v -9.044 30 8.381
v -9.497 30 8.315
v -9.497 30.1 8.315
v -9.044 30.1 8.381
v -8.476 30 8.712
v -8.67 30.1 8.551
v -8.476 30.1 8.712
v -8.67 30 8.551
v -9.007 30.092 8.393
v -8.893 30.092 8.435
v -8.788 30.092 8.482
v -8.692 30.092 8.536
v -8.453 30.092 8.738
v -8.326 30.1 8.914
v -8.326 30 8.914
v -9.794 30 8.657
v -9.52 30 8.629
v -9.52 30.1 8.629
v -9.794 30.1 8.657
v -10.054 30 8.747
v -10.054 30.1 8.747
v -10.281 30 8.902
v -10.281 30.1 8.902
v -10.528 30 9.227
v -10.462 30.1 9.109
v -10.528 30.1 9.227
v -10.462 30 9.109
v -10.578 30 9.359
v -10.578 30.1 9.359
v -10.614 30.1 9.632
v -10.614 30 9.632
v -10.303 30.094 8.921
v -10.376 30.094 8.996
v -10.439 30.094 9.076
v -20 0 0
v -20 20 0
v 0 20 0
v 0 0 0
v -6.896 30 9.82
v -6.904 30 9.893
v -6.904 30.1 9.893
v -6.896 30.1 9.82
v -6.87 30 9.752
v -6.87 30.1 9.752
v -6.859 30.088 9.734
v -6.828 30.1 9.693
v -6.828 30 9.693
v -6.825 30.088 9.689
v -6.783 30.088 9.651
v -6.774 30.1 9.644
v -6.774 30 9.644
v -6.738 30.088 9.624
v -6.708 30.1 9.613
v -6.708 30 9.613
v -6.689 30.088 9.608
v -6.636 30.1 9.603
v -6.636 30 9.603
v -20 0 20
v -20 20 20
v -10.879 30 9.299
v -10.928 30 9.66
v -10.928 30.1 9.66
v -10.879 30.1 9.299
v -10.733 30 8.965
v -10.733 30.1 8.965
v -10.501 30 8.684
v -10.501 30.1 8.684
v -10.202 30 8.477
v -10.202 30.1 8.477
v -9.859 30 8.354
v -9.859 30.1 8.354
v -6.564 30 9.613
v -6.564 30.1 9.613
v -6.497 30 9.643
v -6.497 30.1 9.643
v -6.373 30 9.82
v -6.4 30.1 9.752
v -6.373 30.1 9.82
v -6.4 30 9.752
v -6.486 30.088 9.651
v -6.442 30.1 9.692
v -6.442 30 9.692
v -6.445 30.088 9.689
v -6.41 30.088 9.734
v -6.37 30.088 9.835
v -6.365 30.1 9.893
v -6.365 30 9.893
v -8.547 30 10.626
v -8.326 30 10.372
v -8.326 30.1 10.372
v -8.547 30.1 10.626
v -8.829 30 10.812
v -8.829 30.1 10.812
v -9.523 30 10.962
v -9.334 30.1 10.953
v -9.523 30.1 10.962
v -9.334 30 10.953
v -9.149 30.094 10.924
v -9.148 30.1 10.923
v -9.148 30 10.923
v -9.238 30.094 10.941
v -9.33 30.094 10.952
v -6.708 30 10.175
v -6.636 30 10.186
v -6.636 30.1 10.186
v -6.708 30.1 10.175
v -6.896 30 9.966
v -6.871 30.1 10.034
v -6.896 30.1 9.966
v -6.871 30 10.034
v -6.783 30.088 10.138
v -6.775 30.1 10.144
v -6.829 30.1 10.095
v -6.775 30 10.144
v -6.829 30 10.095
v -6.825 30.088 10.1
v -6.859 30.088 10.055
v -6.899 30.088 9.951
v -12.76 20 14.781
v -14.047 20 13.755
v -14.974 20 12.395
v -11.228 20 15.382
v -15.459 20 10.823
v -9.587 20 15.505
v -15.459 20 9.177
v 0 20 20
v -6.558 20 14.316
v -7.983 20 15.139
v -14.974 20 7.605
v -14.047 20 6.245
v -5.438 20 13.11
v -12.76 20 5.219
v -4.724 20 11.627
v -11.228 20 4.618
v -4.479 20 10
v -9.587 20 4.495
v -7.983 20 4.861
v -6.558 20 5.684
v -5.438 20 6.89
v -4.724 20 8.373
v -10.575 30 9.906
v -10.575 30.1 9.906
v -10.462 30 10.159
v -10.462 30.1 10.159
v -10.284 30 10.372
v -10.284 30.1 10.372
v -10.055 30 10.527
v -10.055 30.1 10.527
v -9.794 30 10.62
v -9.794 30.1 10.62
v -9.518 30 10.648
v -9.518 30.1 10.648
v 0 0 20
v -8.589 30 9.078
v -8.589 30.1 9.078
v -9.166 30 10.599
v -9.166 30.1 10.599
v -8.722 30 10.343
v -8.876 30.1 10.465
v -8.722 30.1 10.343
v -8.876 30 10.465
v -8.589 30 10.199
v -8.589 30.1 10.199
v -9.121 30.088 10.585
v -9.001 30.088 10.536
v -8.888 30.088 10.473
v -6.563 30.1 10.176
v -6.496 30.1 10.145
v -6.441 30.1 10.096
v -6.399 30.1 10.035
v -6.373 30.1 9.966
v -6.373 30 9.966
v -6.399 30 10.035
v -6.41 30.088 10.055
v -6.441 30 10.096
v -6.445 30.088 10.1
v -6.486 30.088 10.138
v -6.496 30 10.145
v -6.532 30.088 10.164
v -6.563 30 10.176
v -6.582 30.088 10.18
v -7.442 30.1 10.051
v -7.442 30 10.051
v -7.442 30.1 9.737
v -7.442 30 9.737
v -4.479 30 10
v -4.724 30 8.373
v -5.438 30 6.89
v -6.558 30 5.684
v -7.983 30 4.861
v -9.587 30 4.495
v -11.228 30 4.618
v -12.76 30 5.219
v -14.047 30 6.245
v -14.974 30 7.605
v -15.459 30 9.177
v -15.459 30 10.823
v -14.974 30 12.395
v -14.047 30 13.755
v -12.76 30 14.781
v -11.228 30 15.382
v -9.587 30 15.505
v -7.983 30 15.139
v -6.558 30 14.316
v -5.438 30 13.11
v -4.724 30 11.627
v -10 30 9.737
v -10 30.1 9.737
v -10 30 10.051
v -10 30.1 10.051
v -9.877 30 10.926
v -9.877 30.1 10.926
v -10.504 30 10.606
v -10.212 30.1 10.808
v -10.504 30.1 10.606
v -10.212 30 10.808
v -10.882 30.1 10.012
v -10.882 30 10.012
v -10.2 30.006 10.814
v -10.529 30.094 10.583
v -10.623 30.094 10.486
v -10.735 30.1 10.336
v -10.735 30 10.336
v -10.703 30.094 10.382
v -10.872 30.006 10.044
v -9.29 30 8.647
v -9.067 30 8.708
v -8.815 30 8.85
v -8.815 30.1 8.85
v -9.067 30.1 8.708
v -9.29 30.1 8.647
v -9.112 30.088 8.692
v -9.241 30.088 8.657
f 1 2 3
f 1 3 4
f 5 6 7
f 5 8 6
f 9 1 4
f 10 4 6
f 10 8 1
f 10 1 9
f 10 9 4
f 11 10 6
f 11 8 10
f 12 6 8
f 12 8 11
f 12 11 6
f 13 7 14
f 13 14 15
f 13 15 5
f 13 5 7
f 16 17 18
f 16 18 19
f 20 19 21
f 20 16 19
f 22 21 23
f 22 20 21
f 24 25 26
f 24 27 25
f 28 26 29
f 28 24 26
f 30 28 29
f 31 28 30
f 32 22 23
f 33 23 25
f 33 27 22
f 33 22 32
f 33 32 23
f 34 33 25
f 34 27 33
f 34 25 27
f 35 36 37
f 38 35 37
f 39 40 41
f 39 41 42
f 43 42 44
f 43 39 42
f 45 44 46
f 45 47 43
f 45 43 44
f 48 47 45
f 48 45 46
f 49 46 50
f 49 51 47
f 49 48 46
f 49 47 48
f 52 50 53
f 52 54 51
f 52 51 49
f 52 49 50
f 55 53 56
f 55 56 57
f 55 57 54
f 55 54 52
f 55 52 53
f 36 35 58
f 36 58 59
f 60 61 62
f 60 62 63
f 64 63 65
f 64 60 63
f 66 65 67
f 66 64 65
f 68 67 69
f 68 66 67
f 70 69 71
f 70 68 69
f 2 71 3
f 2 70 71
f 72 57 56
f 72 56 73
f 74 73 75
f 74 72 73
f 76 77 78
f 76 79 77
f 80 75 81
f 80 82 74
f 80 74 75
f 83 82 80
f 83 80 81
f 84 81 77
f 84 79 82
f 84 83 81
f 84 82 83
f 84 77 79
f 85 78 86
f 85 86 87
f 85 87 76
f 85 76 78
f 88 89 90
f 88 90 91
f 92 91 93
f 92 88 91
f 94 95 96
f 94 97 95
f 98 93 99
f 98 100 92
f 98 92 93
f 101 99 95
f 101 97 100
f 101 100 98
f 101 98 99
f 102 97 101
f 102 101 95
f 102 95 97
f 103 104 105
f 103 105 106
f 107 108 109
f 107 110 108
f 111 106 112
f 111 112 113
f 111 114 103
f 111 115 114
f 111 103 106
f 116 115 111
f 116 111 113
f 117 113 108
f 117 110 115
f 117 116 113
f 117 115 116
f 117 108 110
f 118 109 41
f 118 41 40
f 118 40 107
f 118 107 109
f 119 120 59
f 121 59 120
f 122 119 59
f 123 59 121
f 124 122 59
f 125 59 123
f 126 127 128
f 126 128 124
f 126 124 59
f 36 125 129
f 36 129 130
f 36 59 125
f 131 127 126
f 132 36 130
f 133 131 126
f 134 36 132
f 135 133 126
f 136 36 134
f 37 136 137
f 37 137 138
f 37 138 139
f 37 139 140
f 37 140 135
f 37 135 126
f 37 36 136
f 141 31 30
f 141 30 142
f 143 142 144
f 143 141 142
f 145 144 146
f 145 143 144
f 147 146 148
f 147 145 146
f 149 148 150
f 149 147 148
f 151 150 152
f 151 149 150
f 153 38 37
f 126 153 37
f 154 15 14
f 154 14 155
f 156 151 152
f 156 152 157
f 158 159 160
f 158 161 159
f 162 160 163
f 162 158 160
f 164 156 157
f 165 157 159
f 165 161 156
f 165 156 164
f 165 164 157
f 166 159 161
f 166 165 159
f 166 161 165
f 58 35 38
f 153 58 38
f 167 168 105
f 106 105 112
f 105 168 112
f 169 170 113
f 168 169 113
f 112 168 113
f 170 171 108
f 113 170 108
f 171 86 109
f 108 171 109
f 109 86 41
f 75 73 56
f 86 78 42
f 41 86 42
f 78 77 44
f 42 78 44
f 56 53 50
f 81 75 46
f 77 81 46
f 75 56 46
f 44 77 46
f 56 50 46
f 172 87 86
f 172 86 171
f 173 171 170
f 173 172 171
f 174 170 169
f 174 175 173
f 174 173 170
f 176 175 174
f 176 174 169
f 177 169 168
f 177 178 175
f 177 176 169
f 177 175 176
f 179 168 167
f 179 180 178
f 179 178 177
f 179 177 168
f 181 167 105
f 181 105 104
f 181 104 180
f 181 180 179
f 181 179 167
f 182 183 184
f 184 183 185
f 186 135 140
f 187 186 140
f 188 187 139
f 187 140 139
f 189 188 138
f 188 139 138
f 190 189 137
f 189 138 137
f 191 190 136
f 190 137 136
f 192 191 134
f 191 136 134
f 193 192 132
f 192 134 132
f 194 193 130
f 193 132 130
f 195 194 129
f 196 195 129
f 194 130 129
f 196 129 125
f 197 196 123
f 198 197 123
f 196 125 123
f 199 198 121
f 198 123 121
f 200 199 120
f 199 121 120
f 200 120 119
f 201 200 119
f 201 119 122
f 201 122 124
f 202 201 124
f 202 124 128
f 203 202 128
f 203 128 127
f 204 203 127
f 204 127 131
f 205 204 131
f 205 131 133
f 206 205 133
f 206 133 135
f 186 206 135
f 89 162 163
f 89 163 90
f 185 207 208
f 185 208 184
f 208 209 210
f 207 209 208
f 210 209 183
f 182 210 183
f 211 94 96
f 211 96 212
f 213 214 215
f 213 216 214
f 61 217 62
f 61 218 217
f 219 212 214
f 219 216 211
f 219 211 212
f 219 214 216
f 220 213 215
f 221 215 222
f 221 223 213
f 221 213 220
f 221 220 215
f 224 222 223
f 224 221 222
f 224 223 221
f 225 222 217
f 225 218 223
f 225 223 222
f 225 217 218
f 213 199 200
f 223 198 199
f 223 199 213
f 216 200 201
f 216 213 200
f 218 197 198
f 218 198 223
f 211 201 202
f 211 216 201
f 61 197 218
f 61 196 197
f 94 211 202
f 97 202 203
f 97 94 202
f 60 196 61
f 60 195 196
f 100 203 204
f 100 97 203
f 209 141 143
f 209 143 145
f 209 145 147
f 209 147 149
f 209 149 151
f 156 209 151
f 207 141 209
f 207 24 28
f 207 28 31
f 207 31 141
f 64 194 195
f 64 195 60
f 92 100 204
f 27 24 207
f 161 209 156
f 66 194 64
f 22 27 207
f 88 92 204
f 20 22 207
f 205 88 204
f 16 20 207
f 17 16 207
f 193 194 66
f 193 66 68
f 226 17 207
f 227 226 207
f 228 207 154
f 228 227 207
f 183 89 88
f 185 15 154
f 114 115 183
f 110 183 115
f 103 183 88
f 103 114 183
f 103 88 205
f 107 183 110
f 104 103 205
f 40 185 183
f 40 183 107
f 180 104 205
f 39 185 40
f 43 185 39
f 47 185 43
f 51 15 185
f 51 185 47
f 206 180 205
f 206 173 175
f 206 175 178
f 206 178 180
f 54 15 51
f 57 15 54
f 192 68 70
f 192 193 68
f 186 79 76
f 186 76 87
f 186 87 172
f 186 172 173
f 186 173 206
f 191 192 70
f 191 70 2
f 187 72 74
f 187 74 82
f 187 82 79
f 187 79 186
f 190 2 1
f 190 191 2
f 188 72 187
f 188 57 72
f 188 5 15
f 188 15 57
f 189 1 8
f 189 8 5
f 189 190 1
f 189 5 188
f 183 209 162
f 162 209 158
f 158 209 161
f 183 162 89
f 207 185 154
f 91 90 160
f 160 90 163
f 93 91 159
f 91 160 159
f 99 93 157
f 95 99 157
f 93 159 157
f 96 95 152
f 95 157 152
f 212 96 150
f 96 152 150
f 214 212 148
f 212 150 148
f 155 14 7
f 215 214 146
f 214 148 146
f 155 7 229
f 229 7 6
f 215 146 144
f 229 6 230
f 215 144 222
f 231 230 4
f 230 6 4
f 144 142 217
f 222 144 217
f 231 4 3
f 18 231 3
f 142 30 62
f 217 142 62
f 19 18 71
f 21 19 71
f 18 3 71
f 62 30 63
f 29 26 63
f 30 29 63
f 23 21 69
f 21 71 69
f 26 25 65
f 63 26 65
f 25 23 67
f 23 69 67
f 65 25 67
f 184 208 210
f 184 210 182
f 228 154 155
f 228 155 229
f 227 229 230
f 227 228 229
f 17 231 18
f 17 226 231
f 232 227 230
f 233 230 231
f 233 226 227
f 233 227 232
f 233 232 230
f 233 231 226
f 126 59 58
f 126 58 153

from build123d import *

# Parameters (mm, degrees)
SKETCH1_W           = 20
SKETCH1_H           = 20
BOSS_EXTRUDE1_DEPTH = 20
SKETCH2_R           = 5.520822916
BOSS_EXTRUDE3_DEPTH = 30
BOSS_EXTRUDE4_DEPTH = 0.1
SKETCH4_W           = 2.557692308
SKETCH4_H           = 0.314102564
BOSS_EXTRUDE5_DEPTH = 0.1


with BuildPart() as part:
    # Sketch1 → Boss-Extrude1 (new body)
    with BuildSketch(Plane.XY):
        with Locations((-10, 10)):
            Rectangle(SKETCH1_W, SKETCH1_H)
    extrude(amount=BOSS_EXTRUDE1_DEPTH)

    # Sketch2 → Boss-Extrude3 (add)
    with BuildSketch(Plane(origin=(0, 0, 0), x_dir=(1, 0, 0), z_dir=(0, 1, 0))):
        with Locations((-10, -10)):
            Circle(SKETCH2_R)
    extrude(amount=BOSS_EXTRUDE3_DEPTH)

    # Sketch3 → Boss-Extrude4 (add)
    with BuildSketch(Plane(origin=(0, 30, 0), x_dir=(1, 0, 0), z_dir=(0, 1, 0))):
        with BuildLine():
            Line((-8.325722208, -8.914299791), (-8.588642881, -9.077661169))
            add(Edge.make_bspline(
                [(-8.588642881, -9.077661169), (-8.617472747, -9.041832775), (-8.674219442, -8.971310665), (-8.772758678, -8.880300732), (-8.877770093, -8.80213369), (-8.99104814, -8.738429939), (-9.11243394, -8.689208489), (-9.241448792, -8.654378283), (-9.378074297, -8.63267404), (-9.471739496, -8.630207204), (-9.519732625, -8.628943221)],
                knots=[0, 0, 0, 0, 1.026593902, 2.0206758, 2.988051866, 3.946915611, 4.916868779, 5.907761954, 6.927957743, 8, 8, 8, 8], degree=3))
            add(Edge.make_bspline(
                [(-9.519732625, -8.628943221), (-9.558091582, -8.630000063), (-9.633638505, -8.632081485), (-9.744544658, -8.645091978), (-9.850187011, -8.668733986), (-9.95122772, -8.699884943), (-10.046948139, -8.741635233), (-10.137599057, -8.792444989), (-10.223984547, -8.85149503), (-10.303601288, -8.919905575), (-10.376430295, -8.994304243), (-10.439529209, -9.074057938), (-10.494466143, -9.156777829), (-10.537572099, -9.244529571), (-10.572847269, -9.335305625), (-10.59605399, -9.43081948), (-10.611518685, -9.529847488), (-10.613288014, -9.597365828), (-10.614183747, -9.631547387)],
                knots=[0, 0, 0, 0, 1.112346261, 2.190735716, 3.231507886, 4.247384806, 5.251966152, 6.253067467, 7.256802811, 8.280671706, 9.291813951, 10.270744147, 11.225547591, 12.165006084, 13.100104208, 14.043489273, 15.009504848, 16, 16, 16, 16], degree=3))
            add(Edge.make_bspline(
                [(-10.614183747, -9.631547387), (-10.612404495, -9.676316598), (-10.608869964, -9.765251794), (-10.581168504, -9.896529896), (-10.535824097, -10.023453586), (-10.473766246, -10.145121723), (-10.395289112, -10.257715879), (-10.303116549, -10.358699333), (-10.197197465, -10.446115361), (-10.078465135, -10.518587886), (-9.949707391, -10.576849254), (-9.812317286, -10.618356587), (-9.667417506, -10.643408959), (-9.568210759, -10.646564902), (-9.51762926, -10.64817399)],
                knots=[0, 0, 0, 0, 0.966302908, 1.919585723, 2.883856336, 3.870342332, 4.860282998, 5.839159637, 6.814385684, 7.815993281, 8.834850808, 9.858348828, 10.908058873, 12, 12, 12, 12], degree=3))
            add(Edge.make_bspline(
                [(-9.51762926, -10.64817399), (-9.471274075, -10.646874493), (-9.380173837, -10.644320636), (-9.247006552, -10.622791672), (-9.120226641, -10.587548039), (-8.99983861, -10.538400389), (-8.886062444, -10.474872873), (-8.779633269, -10.396513702), (-8.678433331, -10.305577102), (-8.618936355, -10.23525913), (-8.588642881, -10.199456041)],
                knots=[0, 0, 0, 0, 1.039848629, 2.043578496, 3.018386758, 3.987534228, 4.954977003, 5.934852016, 6.948509513, 8, 8, 8, 8], degree=3))
            Line((-8.588642881, -10.199456041), (-8.325722208, -10.371932003))
            add(Edge.make_bspline(
                [(-8.325722208, -10.371932003), (-8.341309911, -10.39482273), (-8.372433577, -10.440528206), (-8.424461203, -10.504972323), (-8.480581035, -10.565294005), (-8.540574131, -10.621412395), (-8.603657141, -10.674670415), (-8.671985051, -10.722521989), (-8.743354662, -10.767656812), (-8.81860382, -10.808269684), (-8.896954518, -10.844776005), (-8.978296508, -10.876167176), (-9.06227632, -10.903137282), (-9.148992697, -10.924574629), (-9.238616595, -10.941685467), (-9.330916229, -10.953039169), (-9.425859811, -10.96151445), (-9.490031962, -10.962020317), (-9.522537112, -10.962276554)],
                knots=[0, 0, 0, 0, 0.954134338, 1.905101784, 2.851144739, 3.791306361, 4.734911809, 5.6936923, 6.663572882, 7.643865596, 8.638447847, 9.640600242, 10.646758161, 11.676244097, 12.717260333, 13.78922464, 14.880174919, 16, 16, 16, 16], degree=3))
            add(Edge.make_bspline(
                [(-9.522537112, -10.962276554), (-9.572147996, -10.961385274), (-9.669385688, -10.959638359), (-9.811708196, -10.940429884), (-9.947721863, -10.911472268), (-10.077380221, -10.869908534), (-10.200703455, -10.816403758), (-10.317576573, -10.751046844), (-10.427612591, -10.673295054), (-10.529723374, -10.584532285), (-10.62350482, -10.488291644), (-10.704031011, -10.384441726), (-10.773876281, -10.276800678), (-10.829963824, -10.162991152), (-10.874610751, -10.044525779), (-10.905115583, -9.920455539), (-10.924845321, -9.791803285), (-10.927128701, -9.704070403), (-10.928286311, -9.659592259)],
                knots=[0, 0, 0, 0, 1.1129367, 2.181364009, 3.217532258, 4.231199276, 5.232079859, 6.230262199, 7.231623845, 8.250719726, 9.263571943, 10.242672461, 11.195837495, 12.138959767, 13.085126421, 14.0317438, 15.002148558, 16, 16, 16, 16], degree=3))
            add(Edge.make_bspline(
                [(-10.928286311, -9.659592259), (-10.927845295, -9.629413825), (-10.926968041, -9.569383937), (-10.916906113, -9.48028887), (-10.90390764, -9.392380325), (-10.881881903, -9.306772606), (-10.856441271, -9.222167316), (-10.82396574, -9.139584214), (-10.785870345, -9.058639542), (-10.742618397, -8.979541812), (-10.693929652, -8.903592273), (-10.640048419, -8.831838608), (-10.583004083, -8.763418842), (-10.520127971, -8.700695082), (-10.454088317, -8.64115889), (-10.383016741, -8.586400766), (-10.30732089, -8.536259775), (-10.228137567, -8.48980876), (-10.145512856, -8.448449325), (-10.059946185, -8.412816087), (-9.971953156, -8.382363511), (-9.881393012, -8.358254592), (-9.788866839, -8.338037168), (-9.693645501, -8.325319322), (-9.596093279, -8.316333049), (-9.530037256, -8.315342257), (-9.496595606, -8.314840657)],
                knots=[0, 0, 0, 0, 0.990994727, 1.971252077, 2.943264845, 3.907940874, 4.872158414, 5.844625996, 6.82015047, 7.809835459, 8.804511986, 9.781214284, 10.756496977, 11.728388426, 12.696359165, 13.676225489, 14.672885716, 15.677705647, 16.690706858, 17.706033469, 18.721040654, 19.747369689, 20.783475414, 21.830280724, 22.901553713, 24, 24, 24, 24], degree=3))
            add(Edge.make_bspline(
                [(-9.496595606, -8.314840657), (-9.454715498, -8.315762548), (-9.371164618, -8.317601722), (-9.247223911, -8.333080374), (-9.125108718, -8.35641679), (-9.006961614, -8.39098962), (-8.8942151, -8.432853276), (-8.788679649, -8.47986599), (-8.692839546, -8.534460594), (-8.604911956, -8.594180708), (-8.524732439, -8.661541614), (-8.451477947, -8.737348571), (-8.383646297, -8.82120705), (-8.345189586, -8.883012781), (-8.325722208, -8.914299791)],
                knots=[0, 0, 0, 0, 1.095225653, 2.184976855, 3.262915854, 4.344593502, 5.400796181, 6.407717688, 7.363229445, 8.282371371, 9.184954523, 10.097238608, 11.036792983, 12, 12, 12, 12], degree=3))
        make_face()
    extrude(amount=BOSS_EXTRUDE4_DEPTH)

    # Sketch4 → Boss-Extrude5 (add)
    with BuildSketch(Plane(origin=(0, 30, 0), x_dir=(1, 0, 0), z_dir=(0, 1, 0))):
        with BuildLine():
            add(Edge.make_bspline(
                [(-6.365384615, -9.892828526), (-6.36629269, -9.912316587), (-6.368070874, -9.950477954), (-6.383176643, -10.005717448), (-6.409172417, -10.055966244), (-6.442915564, -10.101200835), (-6.484230683, -10.138698232), (-6.53117379, -10.165585861), (-6.58227867, -10.182750842), (-6.617887461, -10.184835854), (-6.636017628, -10.185897436)],
                knots=[0, 0, 0, 0, 1.054986045, 2.065865298, 3.074122704, 4.105114675, 5.109626121, 6.074217918, 7.019490725, 8, 8, 8, 8], degree=3))
            add(Edge.make_bspline(
                [(-6.636017628, -10.185897436), (-6.653677192, -10.184812106), (-6.688588061, -10.182666538), (-6.738806847, -10.16559855), (-6.785096281, -10.138472811), (-6.826330626, -10.101225793), (-6.86005428, -10.055959652), (-6.886055203, -10.005719191), (-6.901159612, -9.950477495), (-6.902937984, -9.912316432), (-6.903846154, -9.892828526)],
                knots=[0, 0, 0, 0, 0.961106377, 1.899993565, 2.859409042, 3.870007927, 4.90724781, 5.921615355, 6.938620636, 8, 8, 8, 8], degree=3))
            add(Edge.make_bspline(
                [(-6.903846154, -9.892828526), (-6.902967151, -9.873564442), (-6.901256287, -9.836069421), (-6.885874492, -9.78184562), (-6.860110821, -9.732405344), (-6.825863936, -9.687910508), (-6.785370463, -9.649925015), (-6.738771881, -9.622899362), (-6.688596963, -9.60578574), (-6.653680183, -9.603646321), (-6.636017628, -9.602564103)],
                knots=[0, 0, 0, 0, 1.055304112, 2.054011575, 3.063363921, 4.096942562, 5.122536081, 6.088009498, 7.032825006, 8, 8, 8, 8], degree=3))
            add(Edge.make_bspline(
                [(-6.636017628, -9.602564103), (-6.617884357, -9.603622457), (-6.582269469, -9.605701133), (-6.531209353, -9.622912645), (-6.483954162, -9.649696813), (-6.443381916, -9.687935052), (-6.409116, -9.732398919), (-6.383357305, -9.781847293), (-6.36797421, -9.836068977), (-6.366263526, -9.873564292), (-6.365384615, -9.892828526)],
                knots=[0, 0, 0, 0, 0.986662878, 1.937868148, 2.908513651, 3.927890639, 4.955204348, 5.958438607, 6.951092507, 8, 8, 8, 8], degree=3))
        make_face()
        with Locations((-8.721153846, -9.894230769)):
            Rectangle(SKETCH4_W, SKETCH4_H)
    extrude(amount=BOSS_EXTRUDE5_DEPTH)


solid = part.part
